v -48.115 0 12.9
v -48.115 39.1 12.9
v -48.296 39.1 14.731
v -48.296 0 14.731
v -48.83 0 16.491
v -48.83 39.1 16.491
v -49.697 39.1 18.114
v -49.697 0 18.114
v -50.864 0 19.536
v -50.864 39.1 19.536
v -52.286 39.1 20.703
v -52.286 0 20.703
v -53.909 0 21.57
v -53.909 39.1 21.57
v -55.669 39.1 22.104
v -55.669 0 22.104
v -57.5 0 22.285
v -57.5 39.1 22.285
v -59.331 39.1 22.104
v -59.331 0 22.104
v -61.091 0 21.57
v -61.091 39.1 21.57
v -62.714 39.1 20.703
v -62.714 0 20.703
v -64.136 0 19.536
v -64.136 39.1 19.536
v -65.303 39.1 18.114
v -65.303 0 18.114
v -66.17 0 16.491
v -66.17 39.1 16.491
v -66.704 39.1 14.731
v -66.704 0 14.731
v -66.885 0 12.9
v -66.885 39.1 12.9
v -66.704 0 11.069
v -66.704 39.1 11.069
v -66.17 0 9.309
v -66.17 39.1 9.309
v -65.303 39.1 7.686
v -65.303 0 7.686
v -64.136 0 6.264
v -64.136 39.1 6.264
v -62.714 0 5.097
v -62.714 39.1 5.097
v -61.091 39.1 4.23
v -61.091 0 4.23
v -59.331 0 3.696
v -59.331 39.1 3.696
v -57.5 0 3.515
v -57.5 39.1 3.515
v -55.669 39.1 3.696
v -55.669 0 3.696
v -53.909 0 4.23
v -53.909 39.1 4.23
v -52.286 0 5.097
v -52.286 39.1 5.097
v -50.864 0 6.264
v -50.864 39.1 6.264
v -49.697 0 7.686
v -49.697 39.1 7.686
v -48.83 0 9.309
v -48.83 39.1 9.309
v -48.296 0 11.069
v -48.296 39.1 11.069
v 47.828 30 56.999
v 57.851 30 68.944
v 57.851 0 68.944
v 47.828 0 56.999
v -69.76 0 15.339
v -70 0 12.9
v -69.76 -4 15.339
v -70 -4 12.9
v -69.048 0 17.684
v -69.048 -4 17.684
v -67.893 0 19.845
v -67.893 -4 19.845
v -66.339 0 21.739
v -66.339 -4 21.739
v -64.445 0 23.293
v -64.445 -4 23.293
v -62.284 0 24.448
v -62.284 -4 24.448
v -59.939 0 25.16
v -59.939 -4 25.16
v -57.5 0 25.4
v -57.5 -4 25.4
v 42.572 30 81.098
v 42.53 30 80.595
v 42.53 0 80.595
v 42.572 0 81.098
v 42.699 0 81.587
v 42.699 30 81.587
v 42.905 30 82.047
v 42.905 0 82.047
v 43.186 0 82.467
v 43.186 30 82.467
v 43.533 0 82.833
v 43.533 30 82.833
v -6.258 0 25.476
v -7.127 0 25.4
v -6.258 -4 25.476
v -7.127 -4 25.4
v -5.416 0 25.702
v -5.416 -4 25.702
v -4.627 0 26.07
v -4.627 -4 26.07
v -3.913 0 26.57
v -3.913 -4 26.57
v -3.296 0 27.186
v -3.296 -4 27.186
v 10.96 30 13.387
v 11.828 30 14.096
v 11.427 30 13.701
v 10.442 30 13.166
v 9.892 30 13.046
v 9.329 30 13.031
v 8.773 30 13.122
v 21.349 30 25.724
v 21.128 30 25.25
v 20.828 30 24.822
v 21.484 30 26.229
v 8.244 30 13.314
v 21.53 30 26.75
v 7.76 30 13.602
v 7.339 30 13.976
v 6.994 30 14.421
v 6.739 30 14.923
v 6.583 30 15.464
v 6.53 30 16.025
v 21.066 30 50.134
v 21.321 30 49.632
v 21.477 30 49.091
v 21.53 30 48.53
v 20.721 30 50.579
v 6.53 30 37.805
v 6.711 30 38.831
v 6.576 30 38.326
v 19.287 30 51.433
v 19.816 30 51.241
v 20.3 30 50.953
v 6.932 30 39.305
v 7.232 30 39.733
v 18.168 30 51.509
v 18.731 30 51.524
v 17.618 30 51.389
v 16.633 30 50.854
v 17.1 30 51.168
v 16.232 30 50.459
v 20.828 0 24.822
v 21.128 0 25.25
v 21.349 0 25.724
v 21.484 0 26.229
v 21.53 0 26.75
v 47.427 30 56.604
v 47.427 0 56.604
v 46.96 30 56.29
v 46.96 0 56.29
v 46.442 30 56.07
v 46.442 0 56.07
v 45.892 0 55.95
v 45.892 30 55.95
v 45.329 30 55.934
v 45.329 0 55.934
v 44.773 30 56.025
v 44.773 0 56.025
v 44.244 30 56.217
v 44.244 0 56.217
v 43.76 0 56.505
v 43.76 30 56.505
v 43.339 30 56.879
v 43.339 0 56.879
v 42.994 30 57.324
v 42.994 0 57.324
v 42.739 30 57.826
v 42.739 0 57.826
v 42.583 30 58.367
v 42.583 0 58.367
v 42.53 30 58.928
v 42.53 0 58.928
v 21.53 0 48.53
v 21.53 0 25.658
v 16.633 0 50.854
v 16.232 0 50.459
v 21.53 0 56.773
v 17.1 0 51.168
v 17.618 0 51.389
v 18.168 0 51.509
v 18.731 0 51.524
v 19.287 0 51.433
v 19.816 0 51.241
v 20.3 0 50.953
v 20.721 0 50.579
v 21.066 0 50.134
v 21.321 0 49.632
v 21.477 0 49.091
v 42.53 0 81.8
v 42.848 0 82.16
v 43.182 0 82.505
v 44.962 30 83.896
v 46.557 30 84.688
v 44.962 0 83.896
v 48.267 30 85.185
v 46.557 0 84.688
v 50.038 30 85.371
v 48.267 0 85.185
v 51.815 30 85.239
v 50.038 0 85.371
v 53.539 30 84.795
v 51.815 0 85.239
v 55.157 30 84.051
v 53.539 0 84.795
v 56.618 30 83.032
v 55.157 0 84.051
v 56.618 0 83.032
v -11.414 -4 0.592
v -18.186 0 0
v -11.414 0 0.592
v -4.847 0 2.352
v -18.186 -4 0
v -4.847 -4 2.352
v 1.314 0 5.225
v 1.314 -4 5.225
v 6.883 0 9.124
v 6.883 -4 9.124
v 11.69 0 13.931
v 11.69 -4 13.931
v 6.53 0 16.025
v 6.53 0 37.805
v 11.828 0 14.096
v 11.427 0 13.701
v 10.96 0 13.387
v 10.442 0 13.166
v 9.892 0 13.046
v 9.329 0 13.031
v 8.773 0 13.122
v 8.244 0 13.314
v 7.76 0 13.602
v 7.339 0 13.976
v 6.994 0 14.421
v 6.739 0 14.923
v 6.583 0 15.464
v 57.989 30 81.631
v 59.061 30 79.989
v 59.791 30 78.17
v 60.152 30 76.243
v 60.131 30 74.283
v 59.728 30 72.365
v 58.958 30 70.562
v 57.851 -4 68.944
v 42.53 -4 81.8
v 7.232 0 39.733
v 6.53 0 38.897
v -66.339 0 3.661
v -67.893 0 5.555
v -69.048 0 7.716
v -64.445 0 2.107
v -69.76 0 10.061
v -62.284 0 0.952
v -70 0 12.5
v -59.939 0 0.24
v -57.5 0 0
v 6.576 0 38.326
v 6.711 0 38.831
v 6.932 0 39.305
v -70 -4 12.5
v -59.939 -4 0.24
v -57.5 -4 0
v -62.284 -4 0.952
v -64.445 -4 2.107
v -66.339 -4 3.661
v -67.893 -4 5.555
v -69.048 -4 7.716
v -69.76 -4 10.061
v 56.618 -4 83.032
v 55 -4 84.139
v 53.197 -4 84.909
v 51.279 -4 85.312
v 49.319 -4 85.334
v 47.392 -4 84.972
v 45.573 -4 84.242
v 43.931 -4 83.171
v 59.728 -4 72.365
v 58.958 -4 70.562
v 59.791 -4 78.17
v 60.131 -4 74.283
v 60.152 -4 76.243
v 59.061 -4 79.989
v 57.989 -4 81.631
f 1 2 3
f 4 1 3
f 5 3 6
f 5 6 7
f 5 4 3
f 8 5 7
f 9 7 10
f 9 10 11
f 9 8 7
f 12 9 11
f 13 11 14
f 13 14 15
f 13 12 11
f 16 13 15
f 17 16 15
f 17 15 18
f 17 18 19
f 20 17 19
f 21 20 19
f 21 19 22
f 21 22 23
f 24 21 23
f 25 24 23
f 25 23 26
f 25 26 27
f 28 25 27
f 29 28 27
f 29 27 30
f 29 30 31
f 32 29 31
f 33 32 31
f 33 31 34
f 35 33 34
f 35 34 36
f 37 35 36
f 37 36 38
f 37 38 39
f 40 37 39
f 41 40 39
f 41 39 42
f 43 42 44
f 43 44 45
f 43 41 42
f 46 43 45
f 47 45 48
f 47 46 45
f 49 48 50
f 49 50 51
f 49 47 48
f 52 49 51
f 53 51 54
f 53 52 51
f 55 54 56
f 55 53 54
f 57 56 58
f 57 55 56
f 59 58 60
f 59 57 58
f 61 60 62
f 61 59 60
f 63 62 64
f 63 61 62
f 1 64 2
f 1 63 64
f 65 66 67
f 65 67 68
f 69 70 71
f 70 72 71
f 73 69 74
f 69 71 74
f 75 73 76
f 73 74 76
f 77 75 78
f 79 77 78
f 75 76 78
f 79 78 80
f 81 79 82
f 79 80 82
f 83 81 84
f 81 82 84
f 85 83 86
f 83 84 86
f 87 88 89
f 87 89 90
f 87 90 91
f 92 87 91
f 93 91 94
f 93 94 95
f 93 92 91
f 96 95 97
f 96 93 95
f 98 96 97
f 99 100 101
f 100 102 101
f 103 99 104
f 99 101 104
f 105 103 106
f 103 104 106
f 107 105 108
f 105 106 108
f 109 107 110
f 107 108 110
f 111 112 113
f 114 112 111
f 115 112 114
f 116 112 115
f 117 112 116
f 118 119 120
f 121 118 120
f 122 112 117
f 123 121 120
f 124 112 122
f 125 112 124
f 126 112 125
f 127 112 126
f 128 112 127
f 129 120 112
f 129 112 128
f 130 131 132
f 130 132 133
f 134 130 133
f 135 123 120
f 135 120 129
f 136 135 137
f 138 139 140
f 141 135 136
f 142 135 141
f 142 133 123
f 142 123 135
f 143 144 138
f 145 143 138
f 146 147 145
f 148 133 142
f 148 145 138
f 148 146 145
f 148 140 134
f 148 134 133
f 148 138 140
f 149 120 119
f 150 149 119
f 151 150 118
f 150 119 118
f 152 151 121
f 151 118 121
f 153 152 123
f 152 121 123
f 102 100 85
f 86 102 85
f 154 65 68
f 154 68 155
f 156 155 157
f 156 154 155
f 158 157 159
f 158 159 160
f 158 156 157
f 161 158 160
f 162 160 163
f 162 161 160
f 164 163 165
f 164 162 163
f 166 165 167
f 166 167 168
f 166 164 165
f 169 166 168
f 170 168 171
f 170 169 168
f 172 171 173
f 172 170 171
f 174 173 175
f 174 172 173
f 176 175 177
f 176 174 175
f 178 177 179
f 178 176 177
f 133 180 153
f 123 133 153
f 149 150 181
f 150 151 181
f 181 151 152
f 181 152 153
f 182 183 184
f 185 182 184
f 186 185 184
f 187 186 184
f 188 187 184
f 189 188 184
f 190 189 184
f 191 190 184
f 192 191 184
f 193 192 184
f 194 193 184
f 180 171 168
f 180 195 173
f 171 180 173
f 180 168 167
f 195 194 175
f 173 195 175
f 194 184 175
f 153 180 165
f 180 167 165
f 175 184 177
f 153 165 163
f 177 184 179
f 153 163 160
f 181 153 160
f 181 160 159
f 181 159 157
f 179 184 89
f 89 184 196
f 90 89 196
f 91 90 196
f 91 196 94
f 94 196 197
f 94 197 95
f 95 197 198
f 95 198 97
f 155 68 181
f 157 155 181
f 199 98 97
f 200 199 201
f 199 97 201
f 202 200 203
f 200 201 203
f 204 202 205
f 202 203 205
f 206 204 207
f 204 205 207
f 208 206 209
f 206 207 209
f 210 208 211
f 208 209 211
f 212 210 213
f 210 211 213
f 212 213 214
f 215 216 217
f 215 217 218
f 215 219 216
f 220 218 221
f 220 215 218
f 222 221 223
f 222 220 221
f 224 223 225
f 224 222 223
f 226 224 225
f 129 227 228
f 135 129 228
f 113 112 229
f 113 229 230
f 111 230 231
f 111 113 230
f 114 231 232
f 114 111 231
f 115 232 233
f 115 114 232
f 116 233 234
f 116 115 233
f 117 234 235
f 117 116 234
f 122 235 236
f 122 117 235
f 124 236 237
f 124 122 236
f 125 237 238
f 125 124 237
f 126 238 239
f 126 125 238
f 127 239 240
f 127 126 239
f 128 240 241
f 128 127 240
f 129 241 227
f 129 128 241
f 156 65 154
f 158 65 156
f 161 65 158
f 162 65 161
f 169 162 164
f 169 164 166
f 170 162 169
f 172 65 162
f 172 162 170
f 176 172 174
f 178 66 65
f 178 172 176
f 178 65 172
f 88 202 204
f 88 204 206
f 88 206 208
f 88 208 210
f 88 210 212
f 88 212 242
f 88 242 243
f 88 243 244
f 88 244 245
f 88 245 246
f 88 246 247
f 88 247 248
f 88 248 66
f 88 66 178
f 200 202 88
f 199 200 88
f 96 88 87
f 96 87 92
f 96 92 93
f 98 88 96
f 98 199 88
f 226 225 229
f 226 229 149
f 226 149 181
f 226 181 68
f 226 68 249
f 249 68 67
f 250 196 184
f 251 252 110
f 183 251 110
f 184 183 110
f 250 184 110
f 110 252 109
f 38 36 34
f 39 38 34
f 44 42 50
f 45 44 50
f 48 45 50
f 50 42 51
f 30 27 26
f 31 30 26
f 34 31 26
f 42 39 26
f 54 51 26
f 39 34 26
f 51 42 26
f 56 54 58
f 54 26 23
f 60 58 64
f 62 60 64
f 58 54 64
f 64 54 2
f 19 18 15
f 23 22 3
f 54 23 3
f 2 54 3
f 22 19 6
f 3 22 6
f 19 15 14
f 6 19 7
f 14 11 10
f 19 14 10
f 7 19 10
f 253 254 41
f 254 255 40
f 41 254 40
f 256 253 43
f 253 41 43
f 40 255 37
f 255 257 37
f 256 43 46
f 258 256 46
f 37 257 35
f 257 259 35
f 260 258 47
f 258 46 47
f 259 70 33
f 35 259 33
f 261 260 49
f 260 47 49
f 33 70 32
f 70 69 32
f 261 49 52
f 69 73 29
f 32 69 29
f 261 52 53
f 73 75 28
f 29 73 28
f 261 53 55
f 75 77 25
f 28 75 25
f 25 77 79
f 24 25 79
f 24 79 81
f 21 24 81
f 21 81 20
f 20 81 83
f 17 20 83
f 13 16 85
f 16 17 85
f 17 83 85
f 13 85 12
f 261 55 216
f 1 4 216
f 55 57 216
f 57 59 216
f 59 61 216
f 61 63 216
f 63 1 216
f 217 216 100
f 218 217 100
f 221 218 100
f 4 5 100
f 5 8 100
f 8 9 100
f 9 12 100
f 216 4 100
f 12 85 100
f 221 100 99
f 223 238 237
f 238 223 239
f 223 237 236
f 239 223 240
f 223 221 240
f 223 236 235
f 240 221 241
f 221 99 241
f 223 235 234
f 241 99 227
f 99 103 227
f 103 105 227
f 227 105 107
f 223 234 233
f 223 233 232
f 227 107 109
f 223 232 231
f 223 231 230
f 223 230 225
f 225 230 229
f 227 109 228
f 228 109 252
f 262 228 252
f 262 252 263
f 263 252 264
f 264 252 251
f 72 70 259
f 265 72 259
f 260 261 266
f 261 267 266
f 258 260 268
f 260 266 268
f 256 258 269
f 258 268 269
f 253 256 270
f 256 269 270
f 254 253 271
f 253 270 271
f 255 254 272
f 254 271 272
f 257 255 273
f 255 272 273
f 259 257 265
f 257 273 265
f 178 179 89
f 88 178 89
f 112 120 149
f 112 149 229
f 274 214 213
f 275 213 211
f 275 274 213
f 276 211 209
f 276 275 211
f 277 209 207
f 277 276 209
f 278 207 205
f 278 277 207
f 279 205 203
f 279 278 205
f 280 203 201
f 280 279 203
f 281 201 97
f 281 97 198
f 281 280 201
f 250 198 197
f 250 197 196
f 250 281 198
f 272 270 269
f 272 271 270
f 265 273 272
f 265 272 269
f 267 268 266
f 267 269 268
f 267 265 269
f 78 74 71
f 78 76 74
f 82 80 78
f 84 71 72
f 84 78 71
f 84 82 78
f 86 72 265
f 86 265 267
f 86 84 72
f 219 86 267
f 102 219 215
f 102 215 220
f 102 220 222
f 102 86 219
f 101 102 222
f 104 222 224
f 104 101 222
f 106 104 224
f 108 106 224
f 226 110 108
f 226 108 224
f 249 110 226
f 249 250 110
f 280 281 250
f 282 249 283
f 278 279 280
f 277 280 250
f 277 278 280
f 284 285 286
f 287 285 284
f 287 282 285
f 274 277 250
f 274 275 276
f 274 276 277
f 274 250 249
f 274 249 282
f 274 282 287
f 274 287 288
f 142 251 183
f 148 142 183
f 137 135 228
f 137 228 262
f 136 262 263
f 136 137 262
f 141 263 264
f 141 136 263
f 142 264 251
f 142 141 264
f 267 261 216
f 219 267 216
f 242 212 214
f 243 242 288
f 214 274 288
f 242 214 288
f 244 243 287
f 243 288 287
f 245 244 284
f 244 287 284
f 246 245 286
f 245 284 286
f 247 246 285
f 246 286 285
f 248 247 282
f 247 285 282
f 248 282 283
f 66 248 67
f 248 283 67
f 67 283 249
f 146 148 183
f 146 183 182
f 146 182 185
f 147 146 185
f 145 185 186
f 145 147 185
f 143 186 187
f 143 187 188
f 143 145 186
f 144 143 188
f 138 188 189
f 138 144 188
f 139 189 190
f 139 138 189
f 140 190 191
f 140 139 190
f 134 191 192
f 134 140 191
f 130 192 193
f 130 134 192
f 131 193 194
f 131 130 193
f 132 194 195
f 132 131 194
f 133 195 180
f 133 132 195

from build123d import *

# Parameters (mm, degrees)
F1_DEPTH    = 4
F2_R        = 9.99999
F3_R        = 12.5
F6_DEPTH    = 30
F4_R        = 9.3845657054
F7_DEPTH    = 43.1
F8_T1_DEPTH = 50.6060806459
F8_T3_DEPTH = 32.729776757
F8_T5_DEPTH = 33.6001001543
F9_R        = 39
F10_R       = 5


# Not quite as in the source:
# - a fillet or chamfer that OpenCascade refuses, or shapes differently, is made with other operations: its cross-section is extruded or revolved along the edge and cut away or added
# - a fillet or chamfer is up to 0.001 mm smaller than in the source, because OpenCascade refuses the exact size
# - ends of sketch curves that miss each other by under 0.0002 mm in the source are joined


with BuildPart() as f1:
    # F0 (on Front) → F1 (new body)
    with BuildSketch(Plane.XZ):
        Polygon((-70, 0), (0, 0), (64.2787609687, 76.6044443119), (48.9578721063, 89.4601965056), (-4.7950151547, 25.4), (-70, 25.4), align=None)
    extrude(amount=F1_DEPTH)

    # F2 (radius 10 in the source; OpenCascade refuses exactly that, so slightly less here)
    f2_edges = [f1.edges().sort_by_distance(p)[0] for p in [
        (64.278761, -2, 76.604444),
        (48.957872, -2, 89.460197),
    ]]
    fillet(f2_edges, radius=F2_R)

    # F3
    f3_edges = [f1.edges().sort_by_distance(p)[0] for p in [
        (-70, -2, 0),
        (-70, -2, 25.4),
    ]]
    fillet(f3_edges, radius=F3_R)

    # F5 (on face) → F6 (join)
    with BuildSketch(Plane(origin=(0, 0, 0), x_dir=(-1, 0, 0), z_dir=(0, 1, 0))):
        with BuildLine():
            Line((-42.5299960094, 50.6852755372), (-42.5299960094, 81.7997520744))
            ThreePointArc((-42.5299960094, 81.7997520744), (-49.3188826521, 85.3338270849), (-56.618308877, 83.0323268366))
            ThreePointArc((-56.618308877, 83.0323268366), (-60.1523915479, 76.2434337661), (-57.8508912997, 68.9440075412))
            Line((-57.8508912997, 68.9440075412), (-42.5299960094, 50.6852755372))
        make_face()
        Polygon((-6.5299960094, 38.896622741), (-21.5299960094, 56.77292663), (-21.5299960094, 25.6584500928), (-6.5299960094, 7.7821462038), align=None)
    extrude(amount=F6_DEPTH)

    # F4 (on face) → F7 (join)
    with BuildSketch(Plane.XZ.offset(4)):
        with Locations((-57.5, 12.9)):
            Circle(F4_R)
    extrude(amount=-F7_DEPTH)

    # F8: fillet of radius 3 on 6 edges, made by hand

    # F8_s2 → F8_t1 (cut)
    with BuildSketch(Plane.XZ.offset(-50.6060806459)):
        with BuildLine():
            ThreePointArc((16.2318626801, 50.4588572007), (19.5560564394, 51.349572234), (21.5299960094, 48.5304943716))
            Line((21.5299960094, 48.5304943716), (21.5299960094, 56.77292663))
            Line((21.5299960094, 56.77292663), (16.2318626801, 50.4588572007))
        make_face()
        with BuildLine():
            ThreePointArc((11.8281293388, 14.0962156331), (8.5039355794, 13.2055005998), (6.5299960094, 16.0245784622))
            Line((6.5299960094, 16.0245784622), (6.5299960094, 7.7821462038))
            Line((6.5299960094, 7.7821462038), (11.8281293388, 14.0962156331))
        make_face()
        with BuildLine():
            ThreePointArc((47.8281293388, 56.9993449665), (44.5039355794, 56.1086299332), (42.5299960094, 58.9277077956))
            Line((42.5299960094, 58.9277077956), (42.5299960094, 50.6852755372))
            Line((42.5299960094, 50.6852755372), (47.8281293388, 56.9993449665))
        make_face()
    extrude(amount=F8_T1_DEPTH, mode=Mode.SUBTRACT)

    # F8_s4 → F8_t3 (cut)
    with BuildSketch(Plane.XZ.offset(-32.729776757)):
        with BuildLine():
            ThreePointArc((20.8281293388, 24.8219979665), (21.3490738718, 25.7243003656), (21.5299960094, 26.7503607956))
            Line((21.5299960094, 26.7503607956), (21.5299960094, 25.6584500928))
            Line((21.5299960094, 25.6584500928), (20.8281293388, 24.8219979665))
        make_face()
        with BuildLine():
            ThreePointArc((6.5299960094, 37.8047120382), (6.7109181471, 38.8307724682), (7.2318626801, 39.7330748673))
            Line((7.2318626801, 39.7330748673), (6.5299960094, 38.896622741))
            Line((6.5299960094, 38.896622741), (6.5299960094, 37.8047120382))
        make_face()
    extrude(amount=F8_T3_DEPTH, mode=Mode.SUBTRACT)

    # F8_s6 → F8_t5 (cut)
    with BuildSketch(Plane.XZ.offset(-33.6001001543)):
        with BuildLine():
            ThreePointArc((42.5299960094, 80.5949283764), (42.7921129807, 81.8213037352), (43.5326603567, 82.8333765643))
            ThreePointArc((43.5326603567, 82.8333765643), (43.0126982288, 82.3346362508), (42.5299960094, 81.7997520744))
            Line((42.5299960094, 81.7997520744), (42.5299960094, 80.5949283764))
        make_face()
    extrude(amount=F8_T5_DEPTH, mode=Mode.SUBTRACT)

    # F9
    f9_edges = [f1.edges().sort_by_distance(p)[0] for p in [
        (0, -2, 0),
    ]]
    fillet(f9_edges, radius=F9_R)

    # F10
    f10_edges = [f1.edges().sort_by_distance(p)[0] for p in [
        (-4.795015, -2, 25.4),
    ]]
    fillet(f10_edges, radius=F10_R)


solid = f1.part
